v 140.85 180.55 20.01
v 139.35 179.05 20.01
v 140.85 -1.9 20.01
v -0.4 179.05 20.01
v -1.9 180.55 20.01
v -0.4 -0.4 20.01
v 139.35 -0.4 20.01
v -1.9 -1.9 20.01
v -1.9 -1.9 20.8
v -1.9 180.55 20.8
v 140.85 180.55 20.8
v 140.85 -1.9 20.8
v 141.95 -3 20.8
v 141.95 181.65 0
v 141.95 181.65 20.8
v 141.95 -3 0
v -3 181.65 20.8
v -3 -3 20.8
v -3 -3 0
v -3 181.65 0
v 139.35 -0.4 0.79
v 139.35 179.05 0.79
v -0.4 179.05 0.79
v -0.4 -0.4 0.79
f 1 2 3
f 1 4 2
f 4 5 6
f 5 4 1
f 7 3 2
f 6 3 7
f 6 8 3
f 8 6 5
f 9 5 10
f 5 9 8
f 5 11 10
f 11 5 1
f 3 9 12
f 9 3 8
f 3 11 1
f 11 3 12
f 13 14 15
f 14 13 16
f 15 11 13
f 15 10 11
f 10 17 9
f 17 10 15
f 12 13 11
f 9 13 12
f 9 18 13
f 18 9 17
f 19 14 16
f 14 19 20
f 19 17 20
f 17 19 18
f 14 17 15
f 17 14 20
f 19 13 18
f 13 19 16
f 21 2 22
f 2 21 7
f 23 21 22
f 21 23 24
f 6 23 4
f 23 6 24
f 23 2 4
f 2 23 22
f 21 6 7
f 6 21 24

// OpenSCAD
/*

  puzzle_box.scad

  Winston Freer Tile Puzzle: Box
      
  (c) olikraus@gmail.com

  This work is licensed under the Creative Commons Attribution-NonCommercial-ShareAlike 4.0 International License. 
  To view a copy of this license, visit http://creativecommons.org/licenses/by-nc-sa/4.0/.
    
*/

include <winston_freer.scad>;


box();
